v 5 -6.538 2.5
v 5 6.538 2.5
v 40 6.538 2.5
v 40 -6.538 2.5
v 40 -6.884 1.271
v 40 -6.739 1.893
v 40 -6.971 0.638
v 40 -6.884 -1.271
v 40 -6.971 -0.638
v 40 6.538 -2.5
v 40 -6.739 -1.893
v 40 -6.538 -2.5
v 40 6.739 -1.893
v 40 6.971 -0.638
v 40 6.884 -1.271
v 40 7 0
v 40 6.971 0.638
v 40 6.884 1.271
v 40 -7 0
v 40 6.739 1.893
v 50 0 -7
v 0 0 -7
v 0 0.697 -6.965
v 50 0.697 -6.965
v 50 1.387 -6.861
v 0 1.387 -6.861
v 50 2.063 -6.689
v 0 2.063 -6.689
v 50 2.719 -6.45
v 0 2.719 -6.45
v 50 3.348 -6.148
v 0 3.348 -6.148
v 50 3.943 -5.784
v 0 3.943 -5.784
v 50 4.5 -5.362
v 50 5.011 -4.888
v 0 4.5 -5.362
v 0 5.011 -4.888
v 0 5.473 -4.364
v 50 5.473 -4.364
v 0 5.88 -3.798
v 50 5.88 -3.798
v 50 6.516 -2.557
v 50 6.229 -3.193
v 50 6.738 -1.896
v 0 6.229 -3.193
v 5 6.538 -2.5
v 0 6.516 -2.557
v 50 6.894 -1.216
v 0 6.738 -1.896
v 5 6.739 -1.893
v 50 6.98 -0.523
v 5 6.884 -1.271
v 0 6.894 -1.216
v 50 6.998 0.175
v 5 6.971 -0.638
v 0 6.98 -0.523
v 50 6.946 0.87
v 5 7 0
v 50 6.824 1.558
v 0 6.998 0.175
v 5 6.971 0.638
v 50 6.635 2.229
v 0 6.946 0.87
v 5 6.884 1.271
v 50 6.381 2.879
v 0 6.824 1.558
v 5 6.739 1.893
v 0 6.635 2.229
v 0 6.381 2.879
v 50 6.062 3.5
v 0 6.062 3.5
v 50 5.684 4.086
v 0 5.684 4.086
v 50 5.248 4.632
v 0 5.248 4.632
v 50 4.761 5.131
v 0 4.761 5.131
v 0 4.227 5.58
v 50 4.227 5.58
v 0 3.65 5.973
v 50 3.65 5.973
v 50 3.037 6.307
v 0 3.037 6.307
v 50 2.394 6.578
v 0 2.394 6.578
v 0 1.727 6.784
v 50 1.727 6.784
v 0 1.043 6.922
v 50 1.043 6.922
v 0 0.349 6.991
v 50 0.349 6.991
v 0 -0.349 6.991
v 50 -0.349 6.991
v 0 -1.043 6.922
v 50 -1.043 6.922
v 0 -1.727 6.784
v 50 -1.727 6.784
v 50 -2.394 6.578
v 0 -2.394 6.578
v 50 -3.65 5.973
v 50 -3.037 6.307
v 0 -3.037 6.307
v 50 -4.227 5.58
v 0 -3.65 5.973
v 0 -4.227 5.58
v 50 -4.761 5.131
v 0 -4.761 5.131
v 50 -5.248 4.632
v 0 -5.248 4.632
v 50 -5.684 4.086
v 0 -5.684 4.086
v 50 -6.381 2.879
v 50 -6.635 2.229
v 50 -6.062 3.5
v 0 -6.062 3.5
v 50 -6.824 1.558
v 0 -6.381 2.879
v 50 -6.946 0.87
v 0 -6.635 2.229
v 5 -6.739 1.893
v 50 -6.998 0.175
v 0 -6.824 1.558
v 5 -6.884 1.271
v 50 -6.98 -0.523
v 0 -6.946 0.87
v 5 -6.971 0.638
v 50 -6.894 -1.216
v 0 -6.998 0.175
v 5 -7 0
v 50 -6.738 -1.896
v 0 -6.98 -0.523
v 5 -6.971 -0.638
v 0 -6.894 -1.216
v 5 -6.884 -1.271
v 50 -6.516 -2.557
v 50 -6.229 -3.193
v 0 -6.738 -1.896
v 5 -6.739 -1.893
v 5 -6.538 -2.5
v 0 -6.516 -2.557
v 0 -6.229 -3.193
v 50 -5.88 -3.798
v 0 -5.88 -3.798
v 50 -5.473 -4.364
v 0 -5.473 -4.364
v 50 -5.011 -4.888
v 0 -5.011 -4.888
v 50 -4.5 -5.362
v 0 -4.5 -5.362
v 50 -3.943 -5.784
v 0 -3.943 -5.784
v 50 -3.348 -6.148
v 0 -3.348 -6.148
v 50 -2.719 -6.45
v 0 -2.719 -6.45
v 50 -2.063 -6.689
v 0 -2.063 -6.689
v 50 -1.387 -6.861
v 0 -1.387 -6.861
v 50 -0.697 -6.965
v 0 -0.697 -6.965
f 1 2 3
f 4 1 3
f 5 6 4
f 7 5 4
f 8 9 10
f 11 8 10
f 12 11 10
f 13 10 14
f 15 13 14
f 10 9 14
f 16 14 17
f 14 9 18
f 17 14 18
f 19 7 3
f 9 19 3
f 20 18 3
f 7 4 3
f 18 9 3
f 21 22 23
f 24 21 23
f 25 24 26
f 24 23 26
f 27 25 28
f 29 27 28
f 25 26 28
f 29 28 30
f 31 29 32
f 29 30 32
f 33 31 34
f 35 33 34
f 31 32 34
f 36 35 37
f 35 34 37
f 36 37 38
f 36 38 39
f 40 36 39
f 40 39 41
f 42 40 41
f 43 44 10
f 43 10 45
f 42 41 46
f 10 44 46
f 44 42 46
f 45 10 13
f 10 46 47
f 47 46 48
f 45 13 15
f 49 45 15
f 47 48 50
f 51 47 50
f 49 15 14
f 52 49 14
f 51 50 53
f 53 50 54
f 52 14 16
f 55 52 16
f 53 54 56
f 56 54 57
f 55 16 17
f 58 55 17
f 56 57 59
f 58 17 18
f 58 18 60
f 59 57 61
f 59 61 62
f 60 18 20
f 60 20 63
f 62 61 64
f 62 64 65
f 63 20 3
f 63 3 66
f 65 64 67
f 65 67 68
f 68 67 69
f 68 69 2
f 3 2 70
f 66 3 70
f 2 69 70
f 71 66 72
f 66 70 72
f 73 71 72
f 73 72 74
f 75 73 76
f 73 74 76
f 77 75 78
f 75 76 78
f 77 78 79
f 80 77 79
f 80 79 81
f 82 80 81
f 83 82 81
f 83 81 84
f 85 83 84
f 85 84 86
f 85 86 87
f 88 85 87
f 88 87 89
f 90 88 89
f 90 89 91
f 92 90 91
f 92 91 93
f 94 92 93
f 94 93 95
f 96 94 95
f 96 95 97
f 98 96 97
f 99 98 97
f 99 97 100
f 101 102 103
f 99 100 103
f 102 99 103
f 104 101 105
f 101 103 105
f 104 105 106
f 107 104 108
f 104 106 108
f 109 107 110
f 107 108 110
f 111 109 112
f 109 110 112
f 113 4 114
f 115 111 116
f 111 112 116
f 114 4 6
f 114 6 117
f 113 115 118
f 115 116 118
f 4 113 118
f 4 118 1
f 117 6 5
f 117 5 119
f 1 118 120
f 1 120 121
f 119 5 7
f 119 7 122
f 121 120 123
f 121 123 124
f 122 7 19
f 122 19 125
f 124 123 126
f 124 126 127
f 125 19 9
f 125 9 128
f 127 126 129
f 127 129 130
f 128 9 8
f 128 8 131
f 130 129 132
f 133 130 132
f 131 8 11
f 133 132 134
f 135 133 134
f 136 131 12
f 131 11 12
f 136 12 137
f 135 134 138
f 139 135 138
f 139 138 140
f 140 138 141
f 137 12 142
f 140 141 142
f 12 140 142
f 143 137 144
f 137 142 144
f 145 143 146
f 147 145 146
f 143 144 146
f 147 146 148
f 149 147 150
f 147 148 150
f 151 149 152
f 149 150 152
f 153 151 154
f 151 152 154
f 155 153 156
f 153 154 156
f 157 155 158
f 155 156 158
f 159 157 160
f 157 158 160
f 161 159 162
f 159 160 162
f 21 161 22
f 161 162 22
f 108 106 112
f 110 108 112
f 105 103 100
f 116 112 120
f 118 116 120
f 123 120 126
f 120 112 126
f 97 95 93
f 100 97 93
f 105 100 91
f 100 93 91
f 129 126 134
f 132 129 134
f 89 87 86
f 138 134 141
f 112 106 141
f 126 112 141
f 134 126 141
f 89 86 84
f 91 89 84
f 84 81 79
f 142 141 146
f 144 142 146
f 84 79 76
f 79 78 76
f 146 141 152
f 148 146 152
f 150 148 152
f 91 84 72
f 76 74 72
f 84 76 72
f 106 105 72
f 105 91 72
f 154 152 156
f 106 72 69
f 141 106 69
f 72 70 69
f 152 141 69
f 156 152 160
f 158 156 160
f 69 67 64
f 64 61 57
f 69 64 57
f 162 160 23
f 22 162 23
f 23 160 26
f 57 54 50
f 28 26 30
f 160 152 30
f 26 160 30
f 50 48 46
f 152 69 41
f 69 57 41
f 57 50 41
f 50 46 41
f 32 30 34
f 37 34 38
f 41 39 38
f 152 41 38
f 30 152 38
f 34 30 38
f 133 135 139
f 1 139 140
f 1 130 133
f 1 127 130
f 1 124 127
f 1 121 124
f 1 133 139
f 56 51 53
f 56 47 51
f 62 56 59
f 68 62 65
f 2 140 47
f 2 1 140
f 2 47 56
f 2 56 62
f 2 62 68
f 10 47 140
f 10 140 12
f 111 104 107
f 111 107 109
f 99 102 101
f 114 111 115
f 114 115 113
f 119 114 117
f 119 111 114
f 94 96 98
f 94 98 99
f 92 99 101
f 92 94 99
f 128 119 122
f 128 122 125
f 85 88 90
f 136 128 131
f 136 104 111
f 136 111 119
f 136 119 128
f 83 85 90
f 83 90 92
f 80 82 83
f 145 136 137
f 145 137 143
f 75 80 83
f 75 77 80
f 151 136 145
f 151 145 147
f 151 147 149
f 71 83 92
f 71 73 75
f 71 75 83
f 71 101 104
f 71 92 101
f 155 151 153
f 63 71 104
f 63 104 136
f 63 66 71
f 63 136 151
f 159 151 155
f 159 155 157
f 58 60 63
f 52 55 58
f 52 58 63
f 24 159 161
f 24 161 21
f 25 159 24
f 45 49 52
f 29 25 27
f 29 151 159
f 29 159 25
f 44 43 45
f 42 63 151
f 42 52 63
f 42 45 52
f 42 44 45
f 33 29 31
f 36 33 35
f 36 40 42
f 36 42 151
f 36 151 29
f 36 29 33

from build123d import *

# Parameters (mm, degrees)
SKETCH1_R           = 7
BOSS_EXTRUDE1_DEPTH = 50
SKETCH2_W           = 35
SKETCH2_H           = 14
CUT_EXTRUDE1_DEPTH  = 2.5


with BuildPart() as part:
    # Sketch1 → Boss-Extrude1 (new body)
    with BuildSketch(Plane(origin=(0, 0, 0), x_dir=(0, 0, -1), z_dir=(1, 0, 0))):
        Circle(SKETCH1_R)
    extrude(amount=BOSS_EXTRUDE1_DEPTH)

    # Sketch2 → Cut-Extrude1 (cut, symmetric)
    with BuildSketch(Plane.XY):
        with Locations((22.5, 0)):
            Rectangle(SKETCH2_W, SKETCH2_H)
    extrude(amount=CUT_EXTRUDE1_DEPTH, both=True, mode=Mode.SUBTRACT)


solid = part.part
